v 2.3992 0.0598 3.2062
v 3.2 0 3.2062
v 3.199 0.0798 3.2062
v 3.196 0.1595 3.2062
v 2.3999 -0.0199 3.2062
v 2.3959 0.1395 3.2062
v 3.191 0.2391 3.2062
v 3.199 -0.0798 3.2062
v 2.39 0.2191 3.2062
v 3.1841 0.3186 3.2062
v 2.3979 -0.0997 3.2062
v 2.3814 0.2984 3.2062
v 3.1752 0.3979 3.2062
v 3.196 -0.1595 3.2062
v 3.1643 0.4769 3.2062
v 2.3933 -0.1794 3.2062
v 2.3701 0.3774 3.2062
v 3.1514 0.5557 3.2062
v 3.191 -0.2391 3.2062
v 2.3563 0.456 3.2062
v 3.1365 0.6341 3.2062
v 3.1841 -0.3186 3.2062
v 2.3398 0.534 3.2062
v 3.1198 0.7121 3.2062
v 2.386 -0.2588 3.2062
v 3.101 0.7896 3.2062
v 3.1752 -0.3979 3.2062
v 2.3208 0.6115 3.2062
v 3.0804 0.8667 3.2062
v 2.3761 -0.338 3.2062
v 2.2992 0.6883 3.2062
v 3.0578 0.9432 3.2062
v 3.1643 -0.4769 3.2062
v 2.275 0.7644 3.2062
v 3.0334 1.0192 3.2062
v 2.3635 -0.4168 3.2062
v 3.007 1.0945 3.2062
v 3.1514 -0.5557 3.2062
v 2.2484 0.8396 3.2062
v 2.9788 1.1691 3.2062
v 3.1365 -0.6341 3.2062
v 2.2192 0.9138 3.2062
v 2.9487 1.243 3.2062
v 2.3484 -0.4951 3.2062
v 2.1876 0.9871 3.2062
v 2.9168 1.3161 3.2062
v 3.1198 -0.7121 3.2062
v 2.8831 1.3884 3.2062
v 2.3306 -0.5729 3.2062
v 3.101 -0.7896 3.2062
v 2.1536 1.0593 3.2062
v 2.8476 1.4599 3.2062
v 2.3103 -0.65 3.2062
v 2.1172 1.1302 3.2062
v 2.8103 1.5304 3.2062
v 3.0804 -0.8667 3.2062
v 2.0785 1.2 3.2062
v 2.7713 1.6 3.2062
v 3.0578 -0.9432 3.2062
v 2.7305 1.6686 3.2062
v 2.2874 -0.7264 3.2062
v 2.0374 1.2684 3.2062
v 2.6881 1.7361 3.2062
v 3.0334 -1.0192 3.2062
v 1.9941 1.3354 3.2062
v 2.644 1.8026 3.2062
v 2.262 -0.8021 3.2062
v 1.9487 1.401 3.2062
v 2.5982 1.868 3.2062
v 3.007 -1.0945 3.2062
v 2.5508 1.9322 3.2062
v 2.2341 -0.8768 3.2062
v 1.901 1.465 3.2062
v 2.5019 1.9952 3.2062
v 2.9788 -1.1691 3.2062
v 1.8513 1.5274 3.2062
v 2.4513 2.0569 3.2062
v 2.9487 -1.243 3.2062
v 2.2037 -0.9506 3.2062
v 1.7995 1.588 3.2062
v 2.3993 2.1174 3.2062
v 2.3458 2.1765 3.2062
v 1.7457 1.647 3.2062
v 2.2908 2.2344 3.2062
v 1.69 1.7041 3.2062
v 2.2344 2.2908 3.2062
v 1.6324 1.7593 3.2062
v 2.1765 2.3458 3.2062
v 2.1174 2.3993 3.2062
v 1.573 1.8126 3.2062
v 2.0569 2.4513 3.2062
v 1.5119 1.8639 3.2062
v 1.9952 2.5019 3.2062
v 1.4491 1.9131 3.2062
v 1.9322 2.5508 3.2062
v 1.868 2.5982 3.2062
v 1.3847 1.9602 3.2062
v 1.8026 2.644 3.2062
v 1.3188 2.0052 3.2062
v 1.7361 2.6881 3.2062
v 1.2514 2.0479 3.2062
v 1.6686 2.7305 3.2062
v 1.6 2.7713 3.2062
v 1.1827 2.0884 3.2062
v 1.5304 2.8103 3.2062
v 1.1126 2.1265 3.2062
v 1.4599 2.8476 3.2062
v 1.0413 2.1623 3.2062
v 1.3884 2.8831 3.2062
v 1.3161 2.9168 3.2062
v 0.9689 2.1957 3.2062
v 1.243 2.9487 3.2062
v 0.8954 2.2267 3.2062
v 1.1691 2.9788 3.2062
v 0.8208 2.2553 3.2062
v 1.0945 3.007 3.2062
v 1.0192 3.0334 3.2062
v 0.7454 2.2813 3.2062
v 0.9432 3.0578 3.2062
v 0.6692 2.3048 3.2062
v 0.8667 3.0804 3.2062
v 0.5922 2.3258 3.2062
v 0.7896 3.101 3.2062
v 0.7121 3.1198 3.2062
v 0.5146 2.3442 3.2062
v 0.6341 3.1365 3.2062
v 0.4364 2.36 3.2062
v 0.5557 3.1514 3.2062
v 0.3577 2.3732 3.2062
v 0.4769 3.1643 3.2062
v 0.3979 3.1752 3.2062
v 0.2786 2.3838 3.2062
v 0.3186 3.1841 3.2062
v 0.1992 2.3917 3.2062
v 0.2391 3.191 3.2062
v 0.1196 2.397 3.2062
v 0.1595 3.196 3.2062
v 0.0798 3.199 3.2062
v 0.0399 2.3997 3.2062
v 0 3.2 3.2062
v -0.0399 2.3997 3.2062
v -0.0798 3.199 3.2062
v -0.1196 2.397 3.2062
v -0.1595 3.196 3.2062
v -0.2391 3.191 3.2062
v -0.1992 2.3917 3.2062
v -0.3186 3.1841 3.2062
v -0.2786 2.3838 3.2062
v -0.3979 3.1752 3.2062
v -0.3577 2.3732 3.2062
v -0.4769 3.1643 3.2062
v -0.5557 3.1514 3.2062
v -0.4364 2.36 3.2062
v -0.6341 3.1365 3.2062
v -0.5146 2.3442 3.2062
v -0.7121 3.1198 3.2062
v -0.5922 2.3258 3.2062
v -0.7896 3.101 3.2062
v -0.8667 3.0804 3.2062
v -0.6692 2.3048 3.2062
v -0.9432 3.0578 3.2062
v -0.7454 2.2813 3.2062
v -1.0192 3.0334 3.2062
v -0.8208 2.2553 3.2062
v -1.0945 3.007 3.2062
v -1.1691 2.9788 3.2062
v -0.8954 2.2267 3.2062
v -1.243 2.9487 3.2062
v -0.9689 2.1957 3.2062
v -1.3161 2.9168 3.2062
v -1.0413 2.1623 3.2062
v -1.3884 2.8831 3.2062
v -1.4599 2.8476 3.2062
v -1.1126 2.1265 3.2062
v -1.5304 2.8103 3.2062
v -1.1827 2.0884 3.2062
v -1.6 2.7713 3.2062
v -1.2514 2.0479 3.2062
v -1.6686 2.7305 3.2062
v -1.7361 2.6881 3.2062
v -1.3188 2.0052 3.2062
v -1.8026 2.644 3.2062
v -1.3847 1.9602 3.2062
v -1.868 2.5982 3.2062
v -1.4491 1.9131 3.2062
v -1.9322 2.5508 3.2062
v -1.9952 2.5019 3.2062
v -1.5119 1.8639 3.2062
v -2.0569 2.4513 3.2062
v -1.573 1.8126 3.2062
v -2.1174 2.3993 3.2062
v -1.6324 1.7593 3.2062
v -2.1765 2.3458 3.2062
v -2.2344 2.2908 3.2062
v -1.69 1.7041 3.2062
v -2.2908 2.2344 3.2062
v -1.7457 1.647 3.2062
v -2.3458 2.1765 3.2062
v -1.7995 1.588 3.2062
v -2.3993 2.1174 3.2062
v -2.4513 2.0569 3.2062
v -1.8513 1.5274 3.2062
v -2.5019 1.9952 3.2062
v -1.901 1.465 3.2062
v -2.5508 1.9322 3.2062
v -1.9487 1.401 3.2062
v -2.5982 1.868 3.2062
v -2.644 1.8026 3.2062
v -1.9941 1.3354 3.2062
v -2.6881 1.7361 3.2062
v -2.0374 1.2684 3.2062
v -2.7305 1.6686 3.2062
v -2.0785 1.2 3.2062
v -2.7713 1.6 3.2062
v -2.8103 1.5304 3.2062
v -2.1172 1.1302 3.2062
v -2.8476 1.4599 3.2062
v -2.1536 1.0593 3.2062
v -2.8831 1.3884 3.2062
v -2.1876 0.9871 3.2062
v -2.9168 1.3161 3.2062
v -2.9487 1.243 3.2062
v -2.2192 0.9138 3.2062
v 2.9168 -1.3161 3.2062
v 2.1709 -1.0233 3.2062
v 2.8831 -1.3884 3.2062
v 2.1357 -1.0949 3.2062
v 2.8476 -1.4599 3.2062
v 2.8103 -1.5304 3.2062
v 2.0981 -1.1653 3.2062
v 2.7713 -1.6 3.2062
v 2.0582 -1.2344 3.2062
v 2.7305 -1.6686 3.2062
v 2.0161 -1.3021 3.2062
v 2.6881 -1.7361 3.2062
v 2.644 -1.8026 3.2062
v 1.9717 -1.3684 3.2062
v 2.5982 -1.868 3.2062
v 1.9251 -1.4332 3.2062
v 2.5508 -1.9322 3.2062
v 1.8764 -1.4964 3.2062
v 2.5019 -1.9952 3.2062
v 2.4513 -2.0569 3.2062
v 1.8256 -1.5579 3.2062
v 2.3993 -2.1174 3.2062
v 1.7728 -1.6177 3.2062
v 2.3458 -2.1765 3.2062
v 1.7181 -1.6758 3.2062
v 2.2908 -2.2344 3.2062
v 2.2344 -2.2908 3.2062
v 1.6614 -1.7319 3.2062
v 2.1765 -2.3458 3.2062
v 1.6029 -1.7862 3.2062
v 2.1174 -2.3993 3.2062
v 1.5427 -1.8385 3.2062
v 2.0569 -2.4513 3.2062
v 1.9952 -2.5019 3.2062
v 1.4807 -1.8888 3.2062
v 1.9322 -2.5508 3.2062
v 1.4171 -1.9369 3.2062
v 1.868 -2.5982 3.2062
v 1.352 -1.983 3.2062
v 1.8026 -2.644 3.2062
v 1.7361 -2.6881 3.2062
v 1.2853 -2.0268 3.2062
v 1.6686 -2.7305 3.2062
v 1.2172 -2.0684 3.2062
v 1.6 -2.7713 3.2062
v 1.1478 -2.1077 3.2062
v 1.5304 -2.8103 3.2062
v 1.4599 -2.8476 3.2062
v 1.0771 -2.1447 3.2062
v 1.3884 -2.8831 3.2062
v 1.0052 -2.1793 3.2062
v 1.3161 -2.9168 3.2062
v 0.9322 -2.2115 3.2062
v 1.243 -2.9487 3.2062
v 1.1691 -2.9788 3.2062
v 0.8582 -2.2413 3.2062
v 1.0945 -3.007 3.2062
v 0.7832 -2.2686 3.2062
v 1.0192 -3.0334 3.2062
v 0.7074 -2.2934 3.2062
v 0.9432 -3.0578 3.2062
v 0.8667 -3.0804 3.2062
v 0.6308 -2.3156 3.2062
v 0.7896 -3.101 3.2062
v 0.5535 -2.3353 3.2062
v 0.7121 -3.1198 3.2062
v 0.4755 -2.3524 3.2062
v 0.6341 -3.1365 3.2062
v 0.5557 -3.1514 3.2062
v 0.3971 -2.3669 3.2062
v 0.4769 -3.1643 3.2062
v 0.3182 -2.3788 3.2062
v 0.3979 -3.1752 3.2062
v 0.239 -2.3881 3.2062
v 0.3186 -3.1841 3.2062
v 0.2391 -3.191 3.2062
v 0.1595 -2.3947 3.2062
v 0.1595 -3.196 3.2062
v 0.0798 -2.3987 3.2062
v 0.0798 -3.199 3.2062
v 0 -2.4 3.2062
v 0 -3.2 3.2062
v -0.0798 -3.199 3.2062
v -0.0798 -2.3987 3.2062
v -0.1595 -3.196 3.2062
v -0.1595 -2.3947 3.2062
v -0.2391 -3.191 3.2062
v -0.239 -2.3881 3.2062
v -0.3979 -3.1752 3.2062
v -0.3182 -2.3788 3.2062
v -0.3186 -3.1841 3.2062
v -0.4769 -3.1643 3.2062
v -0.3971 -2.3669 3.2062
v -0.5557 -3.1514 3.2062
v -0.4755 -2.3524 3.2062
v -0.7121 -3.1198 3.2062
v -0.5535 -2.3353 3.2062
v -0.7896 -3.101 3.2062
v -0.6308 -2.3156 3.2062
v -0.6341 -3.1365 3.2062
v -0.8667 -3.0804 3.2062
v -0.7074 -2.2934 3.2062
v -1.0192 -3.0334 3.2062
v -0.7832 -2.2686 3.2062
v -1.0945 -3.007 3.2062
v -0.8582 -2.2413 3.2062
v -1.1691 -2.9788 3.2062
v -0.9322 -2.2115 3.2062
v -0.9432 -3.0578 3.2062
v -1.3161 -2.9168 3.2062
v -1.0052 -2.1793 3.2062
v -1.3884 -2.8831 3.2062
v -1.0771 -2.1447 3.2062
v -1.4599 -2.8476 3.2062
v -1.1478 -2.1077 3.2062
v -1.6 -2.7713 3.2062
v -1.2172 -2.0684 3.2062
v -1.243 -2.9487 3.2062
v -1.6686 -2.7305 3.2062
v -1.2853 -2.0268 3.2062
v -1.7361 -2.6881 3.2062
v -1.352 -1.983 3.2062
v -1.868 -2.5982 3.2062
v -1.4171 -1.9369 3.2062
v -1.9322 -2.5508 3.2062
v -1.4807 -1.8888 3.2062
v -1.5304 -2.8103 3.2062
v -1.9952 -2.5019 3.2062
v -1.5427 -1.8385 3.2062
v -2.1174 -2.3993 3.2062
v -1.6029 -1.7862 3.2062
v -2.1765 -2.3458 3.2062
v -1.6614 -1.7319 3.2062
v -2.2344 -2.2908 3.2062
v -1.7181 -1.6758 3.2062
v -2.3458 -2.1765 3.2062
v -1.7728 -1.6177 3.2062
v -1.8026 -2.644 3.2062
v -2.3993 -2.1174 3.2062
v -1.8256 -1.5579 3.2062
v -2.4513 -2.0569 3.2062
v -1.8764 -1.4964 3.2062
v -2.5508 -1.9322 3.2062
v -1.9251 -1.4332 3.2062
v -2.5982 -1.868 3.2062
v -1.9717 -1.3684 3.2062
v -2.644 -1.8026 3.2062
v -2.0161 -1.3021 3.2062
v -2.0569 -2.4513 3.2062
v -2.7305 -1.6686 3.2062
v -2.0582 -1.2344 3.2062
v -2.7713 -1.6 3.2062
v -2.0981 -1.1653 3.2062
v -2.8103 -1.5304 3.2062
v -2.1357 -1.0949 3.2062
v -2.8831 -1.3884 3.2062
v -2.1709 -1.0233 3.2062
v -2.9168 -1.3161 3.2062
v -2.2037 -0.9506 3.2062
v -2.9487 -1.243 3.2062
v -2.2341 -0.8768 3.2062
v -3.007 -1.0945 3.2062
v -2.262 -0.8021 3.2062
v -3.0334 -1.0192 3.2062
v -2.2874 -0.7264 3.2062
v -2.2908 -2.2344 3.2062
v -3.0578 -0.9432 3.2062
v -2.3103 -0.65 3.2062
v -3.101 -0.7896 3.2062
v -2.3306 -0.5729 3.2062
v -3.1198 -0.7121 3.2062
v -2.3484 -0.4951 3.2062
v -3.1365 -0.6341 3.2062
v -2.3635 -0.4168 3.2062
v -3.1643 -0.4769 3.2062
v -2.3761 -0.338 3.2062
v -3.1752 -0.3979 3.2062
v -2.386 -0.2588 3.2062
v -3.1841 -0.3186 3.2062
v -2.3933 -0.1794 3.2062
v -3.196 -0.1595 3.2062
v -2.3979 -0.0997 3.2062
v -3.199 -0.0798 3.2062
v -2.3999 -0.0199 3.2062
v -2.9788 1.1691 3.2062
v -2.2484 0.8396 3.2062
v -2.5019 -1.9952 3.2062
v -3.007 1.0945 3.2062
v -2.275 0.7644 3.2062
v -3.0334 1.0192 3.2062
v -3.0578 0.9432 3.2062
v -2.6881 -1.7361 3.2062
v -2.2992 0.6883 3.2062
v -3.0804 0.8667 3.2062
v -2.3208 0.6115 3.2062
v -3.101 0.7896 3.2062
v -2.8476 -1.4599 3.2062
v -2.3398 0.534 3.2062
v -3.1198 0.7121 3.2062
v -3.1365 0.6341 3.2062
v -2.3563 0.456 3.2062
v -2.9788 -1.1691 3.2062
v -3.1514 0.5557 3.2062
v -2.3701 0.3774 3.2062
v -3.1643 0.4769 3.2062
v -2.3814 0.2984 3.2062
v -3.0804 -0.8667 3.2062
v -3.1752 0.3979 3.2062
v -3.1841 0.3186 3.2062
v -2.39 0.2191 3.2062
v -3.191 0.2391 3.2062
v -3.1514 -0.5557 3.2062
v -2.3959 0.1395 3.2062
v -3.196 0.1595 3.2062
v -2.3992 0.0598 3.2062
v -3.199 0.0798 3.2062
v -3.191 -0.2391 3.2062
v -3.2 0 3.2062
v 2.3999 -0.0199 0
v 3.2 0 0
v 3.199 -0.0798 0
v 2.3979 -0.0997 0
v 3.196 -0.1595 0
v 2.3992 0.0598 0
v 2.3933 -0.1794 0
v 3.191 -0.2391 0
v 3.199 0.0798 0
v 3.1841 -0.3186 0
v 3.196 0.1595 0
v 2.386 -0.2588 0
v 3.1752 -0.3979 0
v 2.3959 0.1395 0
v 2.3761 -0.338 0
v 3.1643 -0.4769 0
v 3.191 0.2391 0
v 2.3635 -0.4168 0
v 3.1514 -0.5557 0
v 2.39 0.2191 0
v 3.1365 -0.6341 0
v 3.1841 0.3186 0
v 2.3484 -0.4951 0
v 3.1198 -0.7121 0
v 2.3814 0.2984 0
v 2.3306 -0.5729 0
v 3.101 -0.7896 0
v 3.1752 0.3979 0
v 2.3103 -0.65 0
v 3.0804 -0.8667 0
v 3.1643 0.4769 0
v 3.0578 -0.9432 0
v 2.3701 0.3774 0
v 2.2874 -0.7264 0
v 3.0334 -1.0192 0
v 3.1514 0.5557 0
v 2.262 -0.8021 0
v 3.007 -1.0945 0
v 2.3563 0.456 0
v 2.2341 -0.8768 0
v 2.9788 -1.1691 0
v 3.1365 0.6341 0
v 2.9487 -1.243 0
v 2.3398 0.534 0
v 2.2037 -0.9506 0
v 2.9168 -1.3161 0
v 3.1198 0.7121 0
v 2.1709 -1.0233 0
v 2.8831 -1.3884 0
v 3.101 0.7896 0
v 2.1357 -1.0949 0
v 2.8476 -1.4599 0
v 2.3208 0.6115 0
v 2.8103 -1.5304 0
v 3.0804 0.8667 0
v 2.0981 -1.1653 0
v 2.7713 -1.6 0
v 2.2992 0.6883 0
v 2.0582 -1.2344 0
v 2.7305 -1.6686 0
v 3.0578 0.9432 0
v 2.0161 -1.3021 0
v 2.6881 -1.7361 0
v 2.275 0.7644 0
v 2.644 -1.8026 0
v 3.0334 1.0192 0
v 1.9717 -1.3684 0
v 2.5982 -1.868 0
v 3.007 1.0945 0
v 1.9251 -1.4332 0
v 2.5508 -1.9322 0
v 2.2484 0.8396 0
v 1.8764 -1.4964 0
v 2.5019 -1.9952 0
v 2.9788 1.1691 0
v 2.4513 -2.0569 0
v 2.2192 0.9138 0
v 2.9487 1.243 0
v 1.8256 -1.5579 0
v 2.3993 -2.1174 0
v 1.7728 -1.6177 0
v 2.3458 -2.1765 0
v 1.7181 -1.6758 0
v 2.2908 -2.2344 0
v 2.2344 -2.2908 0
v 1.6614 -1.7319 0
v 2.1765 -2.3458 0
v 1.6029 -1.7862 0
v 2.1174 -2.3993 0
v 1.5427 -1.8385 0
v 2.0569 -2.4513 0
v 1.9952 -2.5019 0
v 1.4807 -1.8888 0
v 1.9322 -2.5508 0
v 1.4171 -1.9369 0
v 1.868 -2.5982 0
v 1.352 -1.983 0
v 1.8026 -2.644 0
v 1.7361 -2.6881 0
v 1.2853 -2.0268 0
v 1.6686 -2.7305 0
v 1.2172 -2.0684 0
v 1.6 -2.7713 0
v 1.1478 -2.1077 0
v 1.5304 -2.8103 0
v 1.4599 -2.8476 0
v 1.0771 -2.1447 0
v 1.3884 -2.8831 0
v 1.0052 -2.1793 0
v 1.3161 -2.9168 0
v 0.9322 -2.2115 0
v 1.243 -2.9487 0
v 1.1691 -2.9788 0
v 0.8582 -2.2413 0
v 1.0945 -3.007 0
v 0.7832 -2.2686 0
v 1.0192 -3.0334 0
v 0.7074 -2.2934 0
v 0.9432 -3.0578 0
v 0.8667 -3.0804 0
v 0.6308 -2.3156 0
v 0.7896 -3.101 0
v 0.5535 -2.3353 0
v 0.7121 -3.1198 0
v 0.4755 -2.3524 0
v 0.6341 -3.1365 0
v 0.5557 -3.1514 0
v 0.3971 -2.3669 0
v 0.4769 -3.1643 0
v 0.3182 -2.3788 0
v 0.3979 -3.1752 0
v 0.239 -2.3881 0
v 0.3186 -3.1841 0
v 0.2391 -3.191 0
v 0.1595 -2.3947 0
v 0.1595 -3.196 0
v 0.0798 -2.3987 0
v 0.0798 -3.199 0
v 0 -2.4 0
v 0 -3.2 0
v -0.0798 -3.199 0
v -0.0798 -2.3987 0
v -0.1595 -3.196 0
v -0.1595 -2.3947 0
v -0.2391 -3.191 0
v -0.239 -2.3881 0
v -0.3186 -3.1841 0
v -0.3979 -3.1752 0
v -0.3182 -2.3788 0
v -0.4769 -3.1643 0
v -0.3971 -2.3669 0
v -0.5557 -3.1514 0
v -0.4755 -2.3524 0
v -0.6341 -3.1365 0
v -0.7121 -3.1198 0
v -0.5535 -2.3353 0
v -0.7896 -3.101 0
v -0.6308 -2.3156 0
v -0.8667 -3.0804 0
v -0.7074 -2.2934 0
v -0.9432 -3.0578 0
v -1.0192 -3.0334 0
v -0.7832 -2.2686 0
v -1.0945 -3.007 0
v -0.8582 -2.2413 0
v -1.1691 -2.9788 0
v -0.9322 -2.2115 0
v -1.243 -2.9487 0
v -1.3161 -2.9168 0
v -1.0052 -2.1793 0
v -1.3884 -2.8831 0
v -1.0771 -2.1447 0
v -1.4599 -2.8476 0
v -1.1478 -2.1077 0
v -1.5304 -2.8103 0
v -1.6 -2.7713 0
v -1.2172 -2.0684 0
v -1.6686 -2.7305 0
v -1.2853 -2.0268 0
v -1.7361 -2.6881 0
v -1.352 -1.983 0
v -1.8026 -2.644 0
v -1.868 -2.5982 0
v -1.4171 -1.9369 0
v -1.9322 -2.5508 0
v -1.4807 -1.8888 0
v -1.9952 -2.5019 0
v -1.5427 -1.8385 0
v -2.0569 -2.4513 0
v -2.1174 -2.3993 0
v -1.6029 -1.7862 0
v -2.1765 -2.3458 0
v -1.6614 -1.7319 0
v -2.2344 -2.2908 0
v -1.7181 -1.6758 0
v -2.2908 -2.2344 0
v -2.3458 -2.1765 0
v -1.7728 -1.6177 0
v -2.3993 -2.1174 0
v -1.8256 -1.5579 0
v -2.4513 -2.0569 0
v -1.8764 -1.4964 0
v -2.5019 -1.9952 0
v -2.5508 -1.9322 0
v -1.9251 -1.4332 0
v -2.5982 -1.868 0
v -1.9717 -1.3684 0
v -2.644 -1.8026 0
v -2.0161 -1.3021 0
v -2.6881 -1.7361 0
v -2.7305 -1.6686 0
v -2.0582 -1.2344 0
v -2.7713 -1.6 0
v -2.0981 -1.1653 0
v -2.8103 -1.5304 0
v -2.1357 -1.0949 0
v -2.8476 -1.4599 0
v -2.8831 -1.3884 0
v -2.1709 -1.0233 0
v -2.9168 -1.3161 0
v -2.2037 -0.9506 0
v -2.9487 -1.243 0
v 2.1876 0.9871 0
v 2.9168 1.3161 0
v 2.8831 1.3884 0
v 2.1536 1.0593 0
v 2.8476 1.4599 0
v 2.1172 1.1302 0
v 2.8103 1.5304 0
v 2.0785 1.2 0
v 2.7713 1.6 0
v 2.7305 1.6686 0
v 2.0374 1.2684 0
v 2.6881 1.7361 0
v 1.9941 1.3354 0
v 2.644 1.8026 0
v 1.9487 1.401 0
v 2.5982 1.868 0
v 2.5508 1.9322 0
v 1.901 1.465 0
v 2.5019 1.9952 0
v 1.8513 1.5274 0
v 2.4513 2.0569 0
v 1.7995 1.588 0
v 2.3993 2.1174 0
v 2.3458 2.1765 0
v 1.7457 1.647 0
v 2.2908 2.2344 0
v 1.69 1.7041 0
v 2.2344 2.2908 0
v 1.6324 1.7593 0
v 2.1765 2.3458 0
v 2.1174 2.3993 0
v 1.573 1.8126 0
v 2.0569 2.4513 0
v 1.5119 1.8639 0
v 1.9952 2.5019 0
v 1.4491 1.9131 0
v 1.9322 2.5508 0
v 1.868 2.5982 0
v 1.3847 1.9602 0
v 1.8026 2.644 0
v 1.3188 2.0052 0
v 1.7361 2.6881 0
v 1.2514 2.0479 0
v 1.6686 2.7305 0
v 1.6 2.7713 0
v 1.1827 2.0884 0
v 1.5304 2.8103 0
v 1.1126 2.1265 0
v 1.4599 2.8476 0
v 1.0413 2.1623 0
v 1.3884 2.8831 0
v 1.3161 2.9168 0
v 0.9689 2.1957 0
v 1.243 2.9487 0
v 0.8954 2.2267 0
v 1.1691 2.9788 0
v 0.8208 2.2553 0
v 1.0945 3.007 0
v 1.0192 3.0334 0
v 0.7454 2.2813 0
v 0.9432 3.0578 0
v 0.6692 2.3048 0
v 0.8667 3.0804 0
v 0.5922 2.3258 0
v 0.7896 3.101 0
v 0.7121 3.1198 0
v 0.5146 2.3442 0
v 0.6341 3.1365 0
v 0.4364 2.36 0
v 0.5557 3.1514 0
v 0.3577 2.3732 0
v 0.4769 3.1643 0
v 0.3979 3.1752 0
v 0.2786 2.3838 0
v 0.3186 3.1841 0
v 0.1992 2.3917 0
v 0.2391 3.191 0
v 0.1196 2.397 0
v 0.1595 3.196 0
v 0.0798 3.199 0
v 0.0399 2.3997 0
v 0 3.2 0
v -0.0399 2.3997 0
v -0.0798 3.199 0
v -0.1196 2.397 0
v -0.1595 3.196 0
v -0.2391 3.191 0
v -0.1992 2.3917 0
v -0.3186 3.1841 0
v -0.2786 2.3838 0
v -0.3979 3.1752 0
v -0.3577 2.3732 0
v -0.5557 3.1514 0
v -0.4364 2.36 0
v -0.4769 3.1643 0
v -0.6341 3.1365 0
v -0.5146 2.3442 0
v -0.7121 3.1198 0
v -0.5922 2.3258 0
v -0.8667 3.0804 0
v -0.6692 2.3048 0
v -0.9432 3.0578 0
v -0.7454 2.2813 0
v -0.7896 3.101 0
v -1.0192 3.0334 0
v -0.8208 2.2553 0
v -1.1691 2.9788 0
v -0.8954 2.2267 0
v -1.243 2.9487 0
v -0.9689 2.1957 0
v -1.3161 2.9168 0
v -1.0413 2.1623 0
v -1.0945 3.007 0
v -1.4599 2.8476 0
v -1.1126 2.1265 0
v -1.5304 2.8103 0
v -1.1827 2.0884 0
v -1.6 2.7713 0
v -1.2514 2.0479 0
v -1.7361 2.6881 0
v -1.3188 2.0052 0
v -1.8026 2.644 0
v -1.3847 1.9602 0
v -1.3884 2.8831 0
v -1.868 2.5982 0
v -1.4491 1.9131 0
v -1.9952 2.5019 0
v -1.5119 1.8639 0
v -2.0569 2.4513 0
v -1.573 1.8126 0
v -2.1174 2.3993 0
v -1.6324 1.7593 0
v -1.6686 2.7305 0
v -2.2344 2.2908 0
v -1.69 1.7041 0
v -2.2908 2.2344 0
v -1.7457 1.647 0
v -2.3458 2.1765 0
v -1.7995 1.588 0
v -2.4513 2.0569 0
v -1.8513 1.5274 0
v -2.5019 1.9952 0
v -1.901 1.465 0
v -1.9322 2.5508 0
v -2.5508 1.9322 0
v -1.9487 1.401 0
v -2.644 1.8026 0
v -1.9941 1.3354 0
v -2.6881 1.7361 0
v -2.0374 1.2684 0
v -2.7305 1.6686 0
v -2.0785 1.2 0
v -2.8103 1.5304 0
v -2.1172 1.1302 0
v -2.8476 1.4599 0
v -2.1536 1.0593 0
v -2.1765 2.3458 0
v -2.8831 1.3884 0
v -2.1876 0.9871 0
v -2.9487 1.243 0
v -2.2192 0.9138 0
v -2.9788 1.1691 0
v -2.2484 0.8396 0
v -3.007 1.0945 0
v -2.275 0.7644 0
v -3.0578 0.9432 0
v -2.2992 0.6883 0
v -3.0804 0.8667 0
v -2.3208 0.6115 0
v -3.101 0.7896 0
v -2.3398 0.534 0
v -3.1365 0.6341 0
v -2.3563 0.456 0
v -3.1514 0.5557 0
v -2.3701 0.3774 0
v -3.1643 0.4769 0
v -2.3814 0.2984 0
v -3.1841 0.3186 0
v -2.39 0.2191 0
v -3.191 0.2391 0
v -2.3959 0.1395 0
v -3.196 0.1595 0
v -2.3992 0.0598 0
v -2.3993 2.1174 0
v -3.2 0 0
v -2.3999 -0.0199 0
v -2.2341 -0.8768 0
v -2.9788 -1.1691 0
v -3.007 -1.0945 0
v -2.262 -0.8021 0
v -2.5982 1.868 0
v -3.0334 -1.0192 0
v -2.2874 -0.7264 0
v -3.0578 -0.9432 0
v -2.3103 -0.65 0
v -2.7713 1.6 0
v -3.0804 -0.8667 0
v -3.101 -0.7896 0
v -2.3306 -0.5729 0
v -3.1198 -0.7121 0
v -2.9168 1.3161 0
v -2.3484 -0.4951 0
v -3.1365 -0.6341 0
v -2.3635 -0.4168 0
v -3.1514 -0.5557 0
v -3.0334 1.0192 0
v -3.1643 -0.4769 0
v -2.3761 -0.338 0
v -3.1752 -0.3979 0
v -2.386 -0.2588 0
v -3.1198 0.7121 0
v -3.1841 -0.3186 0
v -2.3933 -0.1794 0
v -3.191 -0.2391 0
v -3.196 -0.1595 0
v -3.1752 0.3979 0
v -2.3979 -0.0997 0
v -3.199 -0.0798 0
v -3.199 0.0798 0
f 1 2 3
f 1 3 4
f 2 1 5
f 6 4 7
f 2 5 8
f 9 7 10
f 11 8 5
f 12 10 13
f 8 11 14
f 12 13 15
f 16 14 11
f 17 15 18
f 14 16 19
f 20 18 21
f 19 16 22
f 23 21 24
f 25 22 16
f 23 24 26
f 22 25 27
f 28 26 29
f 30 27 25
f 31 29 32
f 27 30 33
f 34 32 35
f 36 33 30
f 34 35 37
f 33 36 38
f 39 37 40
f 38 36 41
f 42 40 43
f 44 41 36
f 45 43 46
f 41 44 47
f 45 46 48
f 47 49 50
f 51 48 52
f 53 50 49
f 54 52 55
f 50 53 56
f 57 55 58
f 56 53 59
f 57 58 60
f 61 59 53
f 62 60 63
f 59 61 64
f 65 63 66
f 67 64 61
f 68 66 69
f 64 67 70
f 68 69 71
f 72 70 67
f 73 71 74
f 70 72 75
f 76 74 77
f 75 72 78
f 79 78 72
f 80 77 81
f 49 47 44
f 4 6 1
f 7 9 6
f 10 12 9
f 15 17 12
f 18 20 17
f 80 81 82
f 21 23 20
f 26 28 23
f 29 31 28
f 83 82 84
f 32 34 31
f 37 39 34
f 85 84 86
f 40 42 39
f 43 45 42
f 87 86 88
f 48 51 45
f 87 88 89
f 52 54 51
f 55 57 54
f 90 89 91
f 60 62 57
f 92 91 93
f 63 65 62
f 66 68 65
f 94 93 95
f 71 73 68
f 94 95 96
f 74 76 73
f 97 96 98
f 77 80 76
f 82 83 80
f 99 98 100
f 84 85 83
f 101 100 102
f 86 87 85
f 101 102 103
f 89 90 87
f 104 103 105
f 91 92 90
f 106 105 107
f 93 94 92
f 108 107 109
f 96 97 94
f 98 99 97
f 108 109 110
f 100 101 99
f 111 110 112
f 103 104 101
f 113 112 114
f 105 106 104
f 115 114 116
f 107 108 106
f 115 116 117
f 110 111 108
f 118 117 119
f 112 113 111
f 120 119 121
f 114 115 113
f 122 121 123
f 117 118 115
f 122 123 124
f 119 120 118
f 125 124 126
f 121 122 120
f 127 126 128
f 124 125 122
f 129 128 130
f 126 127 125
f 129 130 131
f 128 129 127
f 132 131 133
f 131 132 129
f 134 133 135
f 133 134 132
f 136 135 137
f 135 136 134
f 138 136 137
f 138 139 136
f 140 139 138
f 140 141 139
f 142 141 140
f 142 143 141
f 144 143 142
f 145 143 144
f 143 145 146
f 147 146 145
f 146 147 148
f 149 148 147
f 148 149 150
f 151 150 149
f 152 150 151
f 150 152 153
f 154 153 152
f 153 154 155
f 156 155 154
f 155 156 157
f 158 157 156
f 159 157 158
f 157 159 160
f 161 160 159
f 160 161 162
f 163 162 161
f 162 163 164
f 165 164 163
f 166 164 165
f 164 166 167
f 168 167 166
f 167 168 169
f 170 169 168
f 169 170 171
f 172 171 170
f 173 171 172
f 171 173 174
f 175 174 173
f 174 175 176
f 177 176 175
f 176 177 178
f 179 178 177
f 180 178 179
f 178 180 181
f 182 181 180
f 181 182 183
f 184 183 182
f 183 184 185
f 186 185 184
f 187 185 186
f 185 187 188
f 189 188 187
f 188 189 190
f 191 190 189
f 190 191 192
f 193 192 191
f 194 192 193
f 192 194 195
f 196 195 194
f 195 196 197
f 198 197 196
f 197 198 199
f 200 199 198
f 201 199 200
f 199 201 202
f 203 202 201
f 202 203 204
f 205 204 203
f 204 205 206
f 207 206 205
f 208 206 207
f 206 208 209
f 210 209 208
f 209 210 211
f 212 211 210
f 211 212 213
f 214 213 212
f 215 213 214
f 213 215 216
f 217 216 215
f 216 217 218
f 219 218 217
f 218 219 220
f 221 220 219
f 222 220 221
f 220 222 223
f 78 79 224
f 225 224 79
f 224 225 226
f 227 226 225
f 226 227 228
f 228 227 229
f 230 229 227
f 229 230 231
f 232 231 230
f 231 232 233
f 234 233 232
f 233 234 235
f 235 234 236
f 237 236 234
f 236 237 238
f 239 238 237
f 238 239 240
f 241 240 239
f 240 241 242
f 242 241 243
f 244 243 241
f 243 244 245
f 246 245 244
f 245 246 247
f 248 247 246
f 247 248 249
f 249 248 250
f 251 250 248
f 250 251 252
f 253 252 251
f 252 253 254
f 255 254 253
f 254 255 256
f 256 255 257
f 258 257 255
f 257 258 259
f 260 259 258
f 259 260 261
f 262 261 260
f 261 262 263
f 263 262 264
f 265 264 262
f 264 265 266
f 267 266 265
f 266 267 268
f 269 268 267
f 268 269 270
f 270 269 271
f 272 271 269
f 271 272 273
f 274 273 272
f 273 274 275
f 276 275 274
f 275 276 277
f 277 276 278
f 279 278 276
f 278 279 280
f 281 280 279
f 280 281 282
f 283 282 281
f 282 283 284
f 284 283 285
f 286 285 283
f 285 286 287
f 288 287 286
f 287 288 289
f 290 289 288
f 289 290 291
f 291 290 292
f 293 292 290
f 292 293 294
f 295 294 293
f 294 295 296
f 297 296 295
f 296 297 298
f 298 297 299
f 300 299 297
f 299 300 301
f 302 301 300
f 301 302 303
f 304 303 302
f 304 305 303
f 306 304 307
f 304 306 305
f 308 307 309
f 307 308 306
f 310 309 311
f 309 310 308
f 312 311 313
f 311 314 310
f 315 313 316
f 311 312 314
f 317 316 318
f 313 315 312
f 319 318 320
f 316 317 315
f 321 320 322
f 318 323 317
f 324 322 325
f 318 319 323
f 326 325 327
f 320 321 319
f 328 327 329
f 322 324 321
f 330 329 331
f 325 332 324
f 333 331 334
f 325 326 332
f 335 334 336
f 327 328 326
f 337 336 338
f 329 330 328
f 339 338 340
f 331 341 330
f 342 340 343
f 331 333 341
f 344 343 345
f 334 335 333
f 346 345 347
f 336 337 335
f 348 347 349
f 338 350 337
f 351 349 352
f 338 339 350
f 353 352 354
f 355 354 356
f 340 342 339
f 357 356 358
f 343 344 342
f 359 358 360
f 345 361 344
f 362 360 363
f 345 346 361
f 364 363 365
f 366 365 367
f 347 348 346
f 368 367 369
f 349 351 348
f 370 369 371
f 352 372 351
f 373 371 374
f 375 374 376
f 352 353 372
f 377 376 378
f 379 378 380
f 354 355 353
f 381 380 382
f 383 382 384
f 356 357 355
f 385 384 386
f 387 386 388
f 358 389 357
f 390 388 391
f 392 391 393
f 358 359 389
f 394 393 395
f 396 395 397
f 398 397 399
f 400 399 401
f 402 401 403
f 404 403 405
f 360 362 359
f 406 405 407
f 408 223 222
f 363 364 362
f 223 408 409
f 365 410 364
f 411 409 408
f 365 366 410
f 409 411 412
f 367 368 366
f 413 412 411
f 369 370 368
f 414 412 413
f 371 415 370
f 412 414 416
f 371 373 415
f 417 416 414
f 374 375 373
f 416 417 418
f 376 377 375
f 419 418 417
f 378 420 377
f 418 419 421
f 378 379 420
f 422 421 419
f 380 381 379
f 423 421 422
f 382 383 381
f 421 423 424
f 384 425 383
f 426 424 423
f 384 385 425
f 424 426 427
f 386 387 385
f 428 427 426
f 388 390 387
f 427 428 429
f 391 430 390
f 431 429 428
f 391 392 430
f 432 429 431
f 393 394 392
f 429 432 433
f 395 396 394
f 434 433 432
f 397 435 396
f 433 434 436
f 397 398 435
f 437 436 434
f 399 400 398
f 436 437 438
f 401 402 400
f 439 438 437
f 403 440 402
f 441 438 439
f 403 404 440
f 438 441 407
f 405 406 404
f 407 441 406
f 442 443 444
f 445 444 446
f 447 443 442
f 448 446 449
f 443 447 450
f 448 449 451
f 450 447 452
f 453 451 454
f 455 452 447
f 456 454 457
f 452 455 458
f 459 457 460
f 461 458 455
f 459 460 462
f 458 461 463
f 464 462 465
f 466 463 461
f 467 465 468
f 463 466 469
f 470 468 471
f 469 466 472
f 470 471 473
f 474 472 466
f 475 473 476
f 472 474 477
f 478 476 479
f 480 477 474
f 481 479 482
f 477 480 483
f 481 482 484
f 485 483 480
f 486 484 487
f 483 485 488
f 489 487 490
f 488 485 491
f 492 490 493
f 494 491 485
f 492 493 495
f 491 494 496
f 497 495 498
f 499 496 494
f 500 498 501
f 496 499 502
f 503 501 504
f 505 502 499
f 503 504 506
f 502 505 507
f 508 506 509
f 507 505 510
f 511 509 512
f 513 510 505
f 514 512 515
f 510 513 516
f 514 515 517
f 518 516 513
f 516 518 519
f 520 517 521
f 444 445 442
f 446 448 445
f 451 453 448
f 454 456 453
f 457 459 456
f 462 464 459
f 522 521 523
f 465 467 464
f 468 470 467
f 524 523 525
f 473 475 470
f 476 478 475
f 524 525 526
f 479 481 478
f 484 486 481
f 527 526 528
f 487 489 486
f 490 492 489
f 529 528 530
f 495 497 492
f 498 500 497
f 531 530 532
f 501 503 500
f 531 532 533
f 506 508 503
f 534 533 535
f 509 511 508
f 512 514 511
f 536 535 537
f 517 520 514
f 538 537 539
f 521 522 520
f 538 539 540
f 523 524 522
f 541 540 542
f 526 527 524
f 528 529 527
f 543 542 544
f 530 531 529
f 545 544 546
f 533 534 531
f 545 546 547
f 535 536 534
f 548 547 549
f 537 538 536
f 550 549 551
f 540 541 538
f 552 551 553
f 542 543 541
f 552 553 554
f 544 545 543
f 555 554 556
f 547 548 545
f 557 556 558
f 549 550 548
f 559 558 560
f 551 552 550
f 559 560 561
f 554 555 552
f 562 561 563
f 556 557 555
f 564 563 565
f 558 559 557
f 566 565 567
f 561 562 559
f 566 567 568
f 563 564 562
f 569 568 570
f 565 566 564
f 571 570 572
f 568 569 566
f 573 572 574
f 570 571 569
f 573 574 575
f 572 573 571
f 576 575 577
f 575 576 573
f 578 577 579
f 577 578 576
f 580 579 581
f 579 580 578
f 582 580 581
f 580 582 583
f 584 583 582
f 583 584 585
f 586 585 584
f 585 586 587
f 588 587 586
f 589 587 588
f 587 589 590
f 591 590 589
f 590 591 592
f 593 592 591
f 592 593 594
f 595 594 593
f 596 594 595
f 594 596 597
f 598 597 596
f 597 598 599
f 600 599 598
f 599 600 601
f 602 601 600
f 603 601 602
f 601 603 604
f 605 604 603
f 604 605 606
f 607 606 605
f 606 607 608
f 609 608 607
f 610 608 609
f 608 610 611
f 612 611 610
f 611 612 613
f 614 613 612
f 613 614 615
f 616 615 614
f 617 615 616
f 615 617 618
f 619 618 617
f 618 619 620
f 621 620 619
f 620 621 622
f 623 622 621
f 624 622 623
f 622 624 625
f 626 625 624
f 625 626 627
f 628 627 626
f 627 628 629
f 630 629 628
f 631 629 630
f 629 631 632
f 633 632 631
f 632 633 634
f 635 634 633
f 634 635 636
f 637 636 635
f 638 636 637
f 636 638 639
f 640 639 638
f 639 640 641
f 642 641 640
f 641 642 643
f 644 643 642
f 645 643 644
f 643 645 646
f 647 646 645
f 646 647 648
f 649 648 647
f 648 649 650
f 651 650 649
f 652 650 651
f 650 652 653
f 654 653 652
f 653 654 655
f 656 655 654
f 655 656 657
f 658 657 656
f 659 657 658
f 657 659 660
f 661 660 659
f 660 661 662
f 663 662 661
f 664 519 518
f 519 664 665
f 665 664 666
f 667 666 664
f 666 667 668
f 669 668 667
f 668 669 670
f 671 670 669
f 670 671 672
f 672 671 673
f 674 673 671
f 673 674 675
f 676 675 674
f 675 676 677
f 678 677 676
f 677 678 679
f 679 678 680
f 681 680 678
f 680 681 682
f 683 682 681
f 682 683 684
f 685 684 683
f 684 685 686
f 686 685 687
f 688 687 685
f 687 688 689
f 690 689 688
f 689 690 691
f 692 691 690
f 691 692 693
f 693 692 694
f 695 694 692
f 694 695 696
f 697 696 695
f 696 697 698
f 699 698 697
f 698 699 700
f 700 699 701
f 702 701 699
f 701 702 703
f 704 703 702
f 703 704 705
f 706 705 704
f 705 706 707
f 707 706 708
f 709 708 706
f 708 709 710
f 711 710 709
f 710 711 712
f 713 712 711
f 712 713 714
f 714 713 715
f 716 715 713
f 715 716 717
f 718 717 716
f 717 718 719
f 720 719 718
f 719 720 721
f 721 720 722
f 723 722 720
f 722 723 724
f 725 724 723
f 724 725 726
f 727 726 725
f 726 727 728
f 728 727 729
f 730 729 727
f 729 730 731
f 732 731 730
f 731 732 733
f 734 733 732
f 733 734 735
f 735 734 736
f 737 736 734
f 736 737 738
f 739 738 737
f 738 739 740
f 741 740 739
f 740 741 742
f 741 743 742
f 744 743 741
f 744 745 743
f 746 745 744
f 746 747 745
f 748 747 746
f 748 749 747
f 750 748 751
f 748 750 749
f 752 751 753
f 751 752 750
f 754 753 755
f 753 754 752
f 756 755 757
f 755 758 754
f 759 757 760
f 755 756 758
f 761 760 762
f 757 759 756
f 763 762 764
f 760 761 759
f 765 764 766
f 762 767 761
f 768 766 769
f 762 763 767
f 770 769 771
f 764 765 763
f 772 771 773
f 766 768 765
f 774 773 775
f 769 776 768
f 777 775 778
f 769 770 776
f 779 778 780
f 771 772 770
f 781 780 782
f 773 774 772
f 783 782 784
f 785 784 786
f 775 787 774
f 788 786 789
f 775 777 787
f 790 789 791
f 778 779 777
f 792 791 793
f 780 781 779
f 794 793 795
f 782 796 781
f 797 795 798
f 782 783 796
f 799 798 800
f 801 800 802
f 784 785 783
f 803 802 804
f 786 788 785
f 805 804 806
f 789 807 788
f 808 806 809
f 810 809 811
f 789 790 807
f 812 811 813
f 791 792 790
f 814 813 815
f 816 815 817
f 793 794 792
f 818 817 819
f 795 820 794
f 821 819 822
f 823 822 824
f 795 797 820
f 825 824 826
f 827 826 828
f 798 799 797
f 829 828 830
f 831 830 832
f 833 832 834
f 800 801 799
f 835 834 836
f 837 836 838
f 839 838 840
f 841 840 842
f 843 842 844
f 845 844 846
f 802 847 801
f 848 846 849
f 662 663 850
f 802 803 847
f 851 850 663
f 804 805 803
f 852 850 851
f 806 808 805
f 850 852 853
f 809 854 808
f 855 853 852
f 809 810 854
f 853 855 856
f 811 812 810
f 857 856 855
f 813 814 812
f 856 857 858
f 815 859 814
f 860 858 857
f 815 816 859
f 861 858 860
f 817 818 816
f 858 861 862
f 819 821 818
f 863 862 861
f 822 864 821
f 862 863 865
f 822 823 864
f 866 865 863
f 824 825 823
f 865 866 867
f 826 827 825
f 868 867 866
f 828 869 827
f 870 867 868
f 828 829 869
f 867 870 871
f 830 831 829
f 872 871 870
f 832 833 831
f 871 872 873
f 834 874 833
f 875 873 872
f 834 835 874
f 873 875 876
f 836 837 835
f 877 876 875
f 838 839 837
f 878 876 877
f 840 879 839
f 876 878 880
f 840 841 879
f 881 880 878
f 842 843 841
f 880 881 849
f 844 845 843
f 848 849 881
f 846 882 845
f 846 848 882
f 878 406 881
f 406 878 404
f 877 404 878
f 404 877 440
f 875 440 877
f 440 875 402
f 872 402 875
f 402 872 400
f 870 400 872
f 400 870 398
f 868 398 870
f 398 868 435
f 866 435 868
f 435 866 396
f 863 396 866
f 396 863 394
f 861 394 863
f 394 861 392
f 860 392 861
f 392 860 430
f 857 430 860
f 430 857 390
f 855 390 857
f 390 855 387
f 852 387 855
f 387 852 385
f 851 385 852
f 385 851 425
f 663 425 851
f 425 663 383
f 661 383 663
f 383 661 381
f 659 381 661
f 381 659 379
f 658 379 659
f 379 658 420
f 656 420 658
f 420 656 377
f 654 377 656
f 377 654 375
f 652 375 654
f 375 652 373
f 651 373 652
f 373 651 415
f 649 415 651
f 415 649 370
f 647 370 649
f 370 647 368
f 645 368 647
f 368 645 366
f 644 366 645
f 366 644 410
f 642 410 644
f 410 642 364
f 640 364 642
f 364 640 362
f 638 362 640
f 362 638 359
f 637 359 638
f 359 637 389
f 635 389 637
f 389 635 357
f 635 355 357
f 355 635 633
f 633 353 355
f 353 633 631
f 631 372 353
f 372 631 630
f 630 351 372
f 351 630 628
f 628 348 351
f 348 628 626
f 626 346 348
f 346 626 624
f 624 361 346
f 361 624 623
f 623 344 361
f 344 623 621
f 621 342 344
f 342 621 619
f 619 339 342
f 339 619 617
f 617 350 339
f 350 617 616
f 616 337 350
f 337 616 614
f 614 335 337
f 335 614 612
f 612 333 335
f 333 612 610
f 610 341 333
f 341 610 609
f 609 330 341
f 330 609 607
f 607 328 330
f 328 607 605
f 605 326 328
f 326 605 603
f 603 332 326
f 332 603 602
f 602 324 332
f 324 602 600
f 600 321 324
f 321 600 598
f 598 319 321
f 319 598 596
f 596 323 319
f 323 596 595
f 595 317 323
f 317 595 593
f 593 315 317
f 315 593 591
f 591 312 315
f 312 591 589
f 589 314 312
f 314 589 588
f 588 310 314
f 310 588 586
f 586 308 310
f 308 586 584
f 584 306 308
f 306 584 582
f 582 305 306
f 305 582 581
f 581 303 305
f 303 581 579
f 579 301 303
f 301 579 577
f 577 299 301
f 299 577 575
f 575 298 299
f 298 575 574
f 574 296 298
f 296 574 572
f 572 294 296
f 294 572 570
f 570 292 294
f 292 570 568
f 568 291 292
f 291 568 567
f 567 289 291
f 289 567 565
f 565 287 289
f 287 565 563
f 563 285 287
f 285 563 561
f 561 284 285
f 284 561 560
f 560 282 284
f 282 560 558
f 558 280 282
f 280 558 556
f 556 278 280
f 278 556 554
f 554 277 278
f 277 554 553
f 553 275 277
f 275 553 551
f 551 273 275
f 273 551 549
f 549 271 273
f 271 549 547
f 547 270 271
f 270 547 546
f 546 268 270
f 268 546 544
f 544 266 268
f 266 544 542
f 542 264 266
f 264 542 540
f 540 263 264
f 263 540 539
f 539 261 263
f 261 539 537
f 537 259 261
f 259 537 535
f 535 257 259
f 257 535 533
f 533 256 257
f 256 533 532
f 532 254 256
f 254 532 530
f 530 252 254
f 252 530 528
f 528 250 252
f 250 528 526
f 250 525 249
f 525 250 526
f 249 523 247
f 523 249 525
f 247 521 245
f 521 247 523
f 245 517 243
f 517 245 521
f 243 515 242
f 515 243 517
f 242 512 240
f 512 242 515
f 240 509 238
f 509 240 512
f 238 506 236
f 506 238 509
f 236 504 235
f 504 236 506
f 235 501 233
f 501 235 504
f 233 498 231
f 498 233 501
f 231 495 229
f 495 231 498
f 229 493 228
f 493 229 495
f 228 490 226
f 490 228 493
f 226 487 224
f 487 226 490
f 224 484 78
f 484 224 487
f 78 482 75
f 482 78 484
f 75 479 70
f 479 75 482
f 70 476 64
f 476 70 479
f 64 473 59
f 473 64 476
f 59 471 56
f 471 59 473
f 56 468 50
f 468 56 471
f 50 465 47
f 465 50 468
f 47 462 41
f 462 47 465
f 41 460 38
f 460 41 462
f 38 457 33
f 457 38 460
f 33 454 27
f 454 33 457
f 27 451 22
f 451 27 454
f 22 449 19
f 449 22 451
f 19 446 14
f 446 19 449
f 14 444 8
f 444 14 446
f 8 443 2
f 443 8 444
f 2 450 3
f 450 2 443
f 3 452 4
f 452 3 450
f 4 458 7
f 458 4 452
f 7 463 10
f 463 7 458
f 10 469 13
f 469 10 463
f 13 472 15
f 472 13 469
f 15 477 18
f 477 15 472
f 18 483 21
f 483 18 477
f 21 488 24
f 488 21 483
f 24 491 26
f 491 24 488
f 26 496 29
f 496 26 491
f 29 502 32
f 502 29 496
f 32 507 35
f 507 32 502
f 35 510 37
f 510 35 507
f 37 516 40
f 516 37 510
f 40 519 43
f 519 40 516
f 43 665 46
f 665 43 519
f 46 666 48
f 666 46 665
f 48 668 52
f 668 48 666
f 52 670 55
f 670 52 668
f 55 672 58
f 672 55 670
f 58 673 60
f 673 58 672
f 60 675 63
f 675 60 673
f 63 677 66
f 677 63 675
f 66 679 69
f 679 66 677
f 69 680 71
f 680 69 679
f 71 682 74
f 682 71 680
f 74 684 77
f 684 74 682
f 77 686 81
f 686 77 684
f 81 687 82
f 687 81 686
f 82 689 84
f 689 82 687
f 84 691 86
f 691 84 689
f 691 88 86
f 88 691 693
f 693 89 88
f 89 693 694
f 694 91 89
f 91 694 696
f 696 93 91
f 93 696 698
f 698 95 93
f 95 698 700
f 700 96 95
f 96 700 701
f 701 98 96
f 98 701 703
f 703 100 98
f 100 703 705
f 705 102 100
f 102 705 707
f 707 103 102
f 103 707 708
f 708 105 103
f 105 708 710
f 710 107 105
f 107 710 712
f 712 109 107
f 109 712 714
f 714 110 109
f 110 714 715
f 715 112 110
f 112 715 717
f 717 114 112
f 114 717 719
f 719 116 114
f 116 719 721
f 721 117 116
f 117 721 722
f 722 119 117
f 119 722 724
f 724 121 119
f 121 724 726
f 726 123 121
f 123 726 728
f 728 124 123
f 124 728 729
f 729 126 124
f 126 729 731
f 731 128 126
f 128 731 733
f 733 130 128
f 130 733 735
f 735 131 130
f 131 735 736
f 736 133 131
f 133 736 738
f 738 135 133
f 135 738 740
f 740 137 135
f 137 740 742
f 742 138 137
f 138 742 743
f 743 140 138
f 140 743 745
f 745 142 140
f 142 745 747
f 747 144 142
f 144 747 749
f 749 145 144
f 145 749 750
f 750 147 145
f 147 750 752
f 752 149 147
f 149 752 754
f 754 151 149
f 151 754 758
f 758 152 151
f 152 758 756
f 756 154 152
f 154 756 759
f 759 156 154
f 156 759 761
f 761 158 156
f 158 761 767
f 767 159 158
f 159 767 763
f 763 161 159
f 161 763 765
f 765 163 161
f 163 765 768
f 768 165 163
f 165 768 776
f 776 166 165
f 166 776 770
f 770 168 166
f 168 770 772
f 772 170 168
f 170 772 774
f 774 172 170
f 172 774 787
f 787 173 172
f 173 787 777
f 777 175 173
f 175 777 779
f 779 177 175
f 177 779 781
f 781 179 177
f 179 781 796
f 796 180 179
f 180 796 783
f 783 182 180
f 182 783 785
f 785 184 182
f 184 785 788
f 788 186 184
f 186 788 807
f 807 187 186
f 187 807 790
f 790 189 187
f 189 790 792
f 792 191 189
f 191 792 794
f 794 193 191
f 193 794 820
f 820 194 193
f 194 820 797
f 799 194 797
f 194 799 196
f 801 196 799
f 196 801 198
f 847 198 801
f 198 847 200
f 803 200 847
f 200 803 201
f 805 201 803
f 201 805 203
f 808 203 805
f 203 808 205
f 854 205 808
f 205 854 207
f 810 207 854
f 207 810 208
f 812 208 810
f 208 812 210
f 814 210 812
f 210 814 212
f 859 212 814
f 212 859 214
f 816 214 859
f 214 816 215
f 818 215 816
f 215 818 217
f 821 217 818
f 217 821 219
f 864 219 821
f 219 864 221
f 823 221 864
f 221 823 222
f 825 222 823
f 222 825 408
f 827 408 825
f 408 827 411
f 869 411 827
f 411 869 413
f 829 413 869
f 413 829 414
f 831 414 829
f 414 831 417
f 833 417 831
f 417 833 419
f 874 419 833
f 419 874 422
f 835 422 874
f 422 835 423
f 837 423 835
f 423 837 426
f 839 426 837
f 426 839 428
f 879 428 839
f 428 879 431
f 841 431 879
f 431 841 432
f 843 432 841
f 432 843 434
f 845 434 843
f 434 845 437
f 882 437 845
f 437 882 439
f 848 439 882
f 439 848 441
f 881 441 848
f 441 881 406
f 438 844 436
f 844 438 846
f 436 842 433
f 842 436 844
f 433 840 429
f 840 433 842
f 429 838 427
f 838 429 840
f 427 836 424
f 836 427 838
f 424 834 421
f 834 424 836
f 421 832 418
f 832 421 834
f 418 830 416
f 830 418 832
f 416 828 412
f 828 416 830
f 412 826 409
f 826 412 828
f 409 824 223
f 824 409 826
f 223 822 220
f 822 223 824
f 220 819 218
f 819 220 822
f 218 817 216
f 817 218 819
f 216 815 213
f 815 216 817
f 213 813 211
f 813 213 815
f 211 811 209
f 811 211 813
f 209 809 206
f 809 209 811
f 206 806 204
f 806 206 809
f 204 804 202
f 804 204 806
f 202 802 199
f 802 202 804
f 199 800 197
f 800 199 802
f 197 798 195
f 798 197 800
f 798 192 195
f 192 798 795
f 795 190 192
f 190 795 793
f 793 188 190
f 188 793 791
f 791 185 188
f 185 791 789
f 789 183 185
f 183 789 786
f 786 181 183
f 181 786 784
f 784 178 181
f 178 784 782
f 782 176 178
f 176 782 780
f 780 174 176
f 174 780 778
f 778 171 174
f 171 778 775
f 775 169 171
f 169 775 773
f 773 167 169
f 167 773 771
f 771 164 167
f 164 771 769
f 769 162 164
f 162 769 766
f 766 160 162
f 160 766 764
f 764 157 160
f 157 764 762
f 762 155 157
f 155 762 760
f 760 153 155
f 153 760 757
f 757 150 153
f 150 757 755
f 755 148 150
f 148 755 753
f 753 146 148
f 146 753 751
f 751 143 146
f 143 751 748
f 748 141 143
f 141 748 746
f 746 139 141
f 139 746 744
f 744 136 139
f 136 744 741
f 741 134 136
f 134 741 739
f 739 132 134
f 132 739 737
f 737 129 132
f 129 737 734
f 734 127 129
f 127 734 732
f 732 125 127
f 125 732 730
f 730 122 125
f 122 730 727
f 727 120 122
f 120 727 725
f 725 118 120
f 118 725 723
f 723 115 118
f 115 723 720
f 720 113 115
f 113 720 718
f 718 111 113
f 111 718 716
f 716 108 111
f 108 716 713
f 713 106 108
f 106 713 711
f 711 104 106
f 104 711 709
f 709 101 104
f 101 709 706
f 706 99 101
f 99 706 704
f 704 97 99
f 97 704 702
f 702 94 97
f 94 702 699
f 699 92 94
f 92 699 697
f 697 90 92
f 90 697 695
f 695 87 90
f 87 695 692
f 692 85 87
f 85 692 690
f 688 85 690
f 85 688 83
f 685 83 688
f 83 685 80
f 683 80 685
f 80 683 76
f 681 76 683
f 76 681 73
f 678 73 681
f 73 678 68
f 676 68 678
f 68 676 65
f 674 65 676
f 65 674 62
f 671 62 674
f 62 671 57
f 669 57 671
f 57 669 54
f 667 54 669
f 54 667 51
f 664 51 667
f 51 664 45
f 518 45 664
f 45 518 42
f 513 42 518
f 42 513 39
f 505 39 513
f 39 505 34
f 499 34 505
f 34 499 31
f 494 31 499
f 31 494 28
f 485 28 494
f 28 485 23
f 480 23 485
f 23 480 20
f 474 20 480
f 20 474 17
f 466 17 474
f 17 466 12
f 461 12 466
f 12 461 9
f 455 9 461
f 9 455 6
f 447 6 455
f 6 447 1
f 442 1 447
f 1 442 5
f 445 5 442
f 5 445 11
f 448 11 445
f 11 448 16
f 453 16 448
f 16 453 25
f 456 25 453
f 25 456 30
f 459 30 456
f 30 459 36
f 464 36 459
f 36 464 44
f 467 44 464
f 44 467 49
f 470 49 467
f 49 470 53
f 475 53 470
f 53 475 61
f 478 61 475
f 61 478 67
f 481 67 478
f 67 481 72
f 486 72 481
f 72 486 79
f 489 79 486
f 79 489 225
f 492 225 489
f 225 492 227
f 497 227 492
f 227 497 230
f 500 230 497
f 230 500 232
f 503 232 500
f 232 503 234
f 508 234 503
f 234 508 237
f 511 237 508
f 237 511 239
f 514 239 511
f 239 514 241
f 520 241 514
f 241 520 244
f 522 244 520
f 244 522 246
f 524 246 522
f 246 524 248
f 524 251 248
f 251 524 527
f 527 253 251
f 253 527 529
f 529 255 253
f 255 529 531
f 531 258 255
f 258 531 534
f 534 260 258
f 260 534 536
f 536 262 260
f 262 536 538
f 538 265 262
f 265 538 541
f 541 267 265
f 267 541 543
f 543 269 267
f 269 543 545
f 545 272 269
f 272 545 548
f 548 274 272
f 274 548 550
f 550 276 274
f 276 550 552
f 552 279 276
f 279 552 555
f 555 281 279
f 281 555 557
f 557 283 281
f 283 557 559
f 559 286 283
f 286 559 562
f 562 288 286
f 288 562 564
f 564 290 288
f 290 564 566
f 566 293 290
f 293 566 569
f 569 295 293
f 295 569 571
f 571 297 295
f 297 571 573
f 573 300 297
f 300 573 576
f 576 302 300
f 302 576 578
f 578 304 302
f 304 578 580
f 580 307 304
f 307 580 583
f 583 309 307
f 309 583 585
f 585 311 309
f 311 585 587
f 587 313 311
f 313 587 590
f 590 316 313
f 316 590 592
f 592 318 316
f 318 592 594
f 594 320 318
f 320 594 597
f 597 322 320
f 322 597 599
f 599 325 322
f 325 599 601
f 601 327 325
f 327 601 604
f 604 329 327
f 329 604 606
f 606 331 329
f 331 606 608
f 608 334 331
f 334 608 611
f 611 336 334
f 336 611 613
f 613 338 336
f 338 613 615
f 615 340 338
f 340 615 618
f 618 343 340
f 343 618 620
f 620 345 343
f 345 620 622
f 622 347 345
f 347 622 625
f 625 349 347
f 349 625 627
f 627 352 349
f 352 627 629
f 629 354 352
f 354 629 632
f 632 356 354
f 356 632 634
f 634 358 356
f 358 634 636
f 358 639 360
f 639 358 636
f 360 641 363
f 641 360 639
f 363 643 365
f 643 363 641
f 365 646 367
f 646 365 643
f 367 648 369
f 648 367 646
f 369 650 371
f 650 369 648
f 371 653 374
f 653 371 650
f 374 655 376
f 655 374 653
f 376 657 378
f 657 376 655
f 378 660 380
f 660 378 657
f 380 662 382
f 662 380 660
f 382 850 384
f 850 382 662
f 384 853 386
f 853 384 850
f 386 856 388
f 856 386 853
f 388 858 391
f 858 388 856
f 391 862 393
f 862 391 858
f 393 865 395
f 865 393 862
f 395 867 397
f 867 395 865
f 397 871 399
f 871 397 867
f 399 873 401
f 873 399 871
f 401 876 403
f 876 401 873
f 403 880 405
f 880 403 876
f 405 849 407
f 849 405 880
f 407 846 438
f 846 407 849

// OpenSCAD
use <../lib.scad>
use <../p/4-4cyli.scad>
use <../p/4-4cyls.scad>
use <../p/4-4edge.scad>
use <../p/rect.scad>
use <../p/stud4.scad>
$fa=1; $fs=0.2;
function ldraw_lib__29635(realsolid=false) = [
// 0 Minifig Serving Tray  2 x  3
// 0 Name: 29635.dat
// 0 Author: Gerald Lasser [GeraldLasser]
// 0 !LDRAW_ORG Part UPDATE 2018-02
// 0 !LICENSE Licensed under CC BY 2.0 and CC BY 4.0 : see CAreadme.txt
// 
// 0 BFC CERTIFY CCW
  [0,"BFC","CERTIFY"],
  [0,"BFC","CCW"],
// 
// 0 !CATEGORY Minifig Accessory
// 
// 0 !HISTORY 2018-12-08 [PTadmin] Official Update 2018-02
// 
// 
// 1 16 0 -8 0 1 0 0 0 -2 0 0 0 1 stud4.dat
  [1,16,0,-8,0,1,0,0,0,-2,0,0,0,1, ldraw_lib__stud4(realsolid)],
// 
// 1 16 0 -11 0 26.298275 0 0 0 1 0 0 0 16.298275 rect.dat
  [1,16,0,-11,0,26.298275,0,0,0,1,0,0,0,16.298275, ldraw_lib__rect(realsolid)],
// 1 16 0 -8 0 26.298275 0 0 0 -1 0 0 0 16.298275 rect.dat
  [1,16,0,-8,0,26.298275,0,0,0,-1,0,0,0,16.298275, ldraw_lib__rect(realsolid)],
// 
// 1 16 -26 -9.5 -20 0 52 0 -4 0 0 0 0 4 4-4cyli.dat
  [1,16,-26,-9.5,-20,0,52,0,-4,0,0,0,0,4, ldraw_lib__4_4cyli(realsolid)],
// 1 16 -26 -9.5 20 0 52 0 -4 0 0 0 0 4 4-4cyli.dat
  [1,16,-26,-9.5,20,0,52,0,-4,0,0,0,0,4, ldraw_lib__4_4cyli(realsolid)],
// 1 16 -30 -9.5 16 0 0 4 -4 0 0 0 -32 0 4-4cyli.dat
  [1,16,-30,-9.5,16,0,0,4,-4,0,0,0,-32,0, ldraw_lib__4_4cyli(realsolid)],
// 1 16 30 -9.5 16 0 0 4 -4 0 0 0 -32 0 4-4cyli.dat
  [1,16,30,-9.5,16,0,0,4,-4,0,0,0,-32,0, ldraw_lib__4_4cyli(realsolid)],
// 1 16 -26 -9.5 -20 0 -4 0 0 0 4 4 0 0 4-4cyls.dat
  [1,16,-26,-9.5,-20,0,-4,0,0,0,4,4,0,0, ldraw_lib__4_4cyls(realsolid)],
// 1 16 -30 -9.5 -16 4 0 0 0 0 -4 0 -4 0 4-4cyls.dat
  [1,16,-30,-9.5,-16,4,0,0,0,0,-4,0,-4,0, ldraw_lib__4_4cyls(realsolid)],
// 1 16 26 -9.5 -20 0 4 0 0 0 4 4 0 0 4-4cyls.dat
  [1,16,26,-9.5,-20,0,4,0,0,0,4,4,0,0, ldraw_lib__4_4cyls(realsolid)],
// 1 16 30 -9.5 -16 -4 0 0 0 0 4 0 -4 0 4-4cyls.dat
  [1,16,30,-9.5,-16,-4,0,0,0,0,4,0,-4,0, ldraw_lib__4_4cyls(realsolid)],
// 1 16 -26 -9.5 20 0 -4 0 0 0 4 -4 0 0 4-4cyls.dat
  [1,16,-26,-9.5,20,0,-4,0,0,0,4,-4,0,0, ldraw_lib__4_4cyls(realsolid)],
// 1 16 -30 -9.5 16 4 0 0 0 0 -4 0 4 0 4-4cyls.dat
  [1,16,-30,-9.5,16,4,0,0,0,0,-4,0,4,0, ldraw_lib__4_4cyls(realsolid)],
// 1 16 26 -9.5 20 0 4 0 0 0 4 -4 0 0 4-4cyls.dat
  [1,16,26,-9.5,20,0,4,0,0,0,4,-4,0,0, ldraw_lib__4_4cyls(realsolid)],
// 1 16 30 -9.5 16 -4 0 0 0 0 4 0 4 0 4-4cyls.dat
  [1,16,30,-9.5,16,-4,0,0,0,0,4,0,4,0, ldraw_lib__4_4cyls(realsolid)],
// 
// 1 16 -30 -9.5 -20 0 52 4 -4 0 0 0 0 4 4-4edge.dat
  [1,16,-30,-9.5,-20,0,52,4,-4,0,0,0,0,4, ldraw_lib__4_4edge(realsolid)],
// 1 16 30 -9.5 -20 0 52 -4 -4 0 0 0 0 4 4-4edge.dat
  [1,16,30,-9.5,-20,0,52,-4,-4,0,0,0,0,4, ldraw_lib__4_4edge(realsolid)],
// 1 16 -30 -9.5 20 0 52 -4 -4 0 0 0 0 4 4-4edge.dat
  [1,16,-30,-9.5,20,0,52,-4,-4,0,0,0,0,4, ldraw_lib__4_4edge(realsolid)],
// 1 16 30 -9.5 20 0 52 4 -4 0 0 0 0 4 4-4edge.dat
  [1,16,30,-9.5,20,0,52,4,-4,0,0,0,0,4, ldraw_lib__4_4edge(realsolid)],
];
module ldraw_lib__29635(step=0, col=false, unit=2/5, alt=false, line=0.2, solid=!$preview)
    makepoly(ldraw_lib__29635(solid), step=step, col=col, unit=unit, alt=alt, line=line, solid=solid);
ldraw_lib__29635(line=0.2);
